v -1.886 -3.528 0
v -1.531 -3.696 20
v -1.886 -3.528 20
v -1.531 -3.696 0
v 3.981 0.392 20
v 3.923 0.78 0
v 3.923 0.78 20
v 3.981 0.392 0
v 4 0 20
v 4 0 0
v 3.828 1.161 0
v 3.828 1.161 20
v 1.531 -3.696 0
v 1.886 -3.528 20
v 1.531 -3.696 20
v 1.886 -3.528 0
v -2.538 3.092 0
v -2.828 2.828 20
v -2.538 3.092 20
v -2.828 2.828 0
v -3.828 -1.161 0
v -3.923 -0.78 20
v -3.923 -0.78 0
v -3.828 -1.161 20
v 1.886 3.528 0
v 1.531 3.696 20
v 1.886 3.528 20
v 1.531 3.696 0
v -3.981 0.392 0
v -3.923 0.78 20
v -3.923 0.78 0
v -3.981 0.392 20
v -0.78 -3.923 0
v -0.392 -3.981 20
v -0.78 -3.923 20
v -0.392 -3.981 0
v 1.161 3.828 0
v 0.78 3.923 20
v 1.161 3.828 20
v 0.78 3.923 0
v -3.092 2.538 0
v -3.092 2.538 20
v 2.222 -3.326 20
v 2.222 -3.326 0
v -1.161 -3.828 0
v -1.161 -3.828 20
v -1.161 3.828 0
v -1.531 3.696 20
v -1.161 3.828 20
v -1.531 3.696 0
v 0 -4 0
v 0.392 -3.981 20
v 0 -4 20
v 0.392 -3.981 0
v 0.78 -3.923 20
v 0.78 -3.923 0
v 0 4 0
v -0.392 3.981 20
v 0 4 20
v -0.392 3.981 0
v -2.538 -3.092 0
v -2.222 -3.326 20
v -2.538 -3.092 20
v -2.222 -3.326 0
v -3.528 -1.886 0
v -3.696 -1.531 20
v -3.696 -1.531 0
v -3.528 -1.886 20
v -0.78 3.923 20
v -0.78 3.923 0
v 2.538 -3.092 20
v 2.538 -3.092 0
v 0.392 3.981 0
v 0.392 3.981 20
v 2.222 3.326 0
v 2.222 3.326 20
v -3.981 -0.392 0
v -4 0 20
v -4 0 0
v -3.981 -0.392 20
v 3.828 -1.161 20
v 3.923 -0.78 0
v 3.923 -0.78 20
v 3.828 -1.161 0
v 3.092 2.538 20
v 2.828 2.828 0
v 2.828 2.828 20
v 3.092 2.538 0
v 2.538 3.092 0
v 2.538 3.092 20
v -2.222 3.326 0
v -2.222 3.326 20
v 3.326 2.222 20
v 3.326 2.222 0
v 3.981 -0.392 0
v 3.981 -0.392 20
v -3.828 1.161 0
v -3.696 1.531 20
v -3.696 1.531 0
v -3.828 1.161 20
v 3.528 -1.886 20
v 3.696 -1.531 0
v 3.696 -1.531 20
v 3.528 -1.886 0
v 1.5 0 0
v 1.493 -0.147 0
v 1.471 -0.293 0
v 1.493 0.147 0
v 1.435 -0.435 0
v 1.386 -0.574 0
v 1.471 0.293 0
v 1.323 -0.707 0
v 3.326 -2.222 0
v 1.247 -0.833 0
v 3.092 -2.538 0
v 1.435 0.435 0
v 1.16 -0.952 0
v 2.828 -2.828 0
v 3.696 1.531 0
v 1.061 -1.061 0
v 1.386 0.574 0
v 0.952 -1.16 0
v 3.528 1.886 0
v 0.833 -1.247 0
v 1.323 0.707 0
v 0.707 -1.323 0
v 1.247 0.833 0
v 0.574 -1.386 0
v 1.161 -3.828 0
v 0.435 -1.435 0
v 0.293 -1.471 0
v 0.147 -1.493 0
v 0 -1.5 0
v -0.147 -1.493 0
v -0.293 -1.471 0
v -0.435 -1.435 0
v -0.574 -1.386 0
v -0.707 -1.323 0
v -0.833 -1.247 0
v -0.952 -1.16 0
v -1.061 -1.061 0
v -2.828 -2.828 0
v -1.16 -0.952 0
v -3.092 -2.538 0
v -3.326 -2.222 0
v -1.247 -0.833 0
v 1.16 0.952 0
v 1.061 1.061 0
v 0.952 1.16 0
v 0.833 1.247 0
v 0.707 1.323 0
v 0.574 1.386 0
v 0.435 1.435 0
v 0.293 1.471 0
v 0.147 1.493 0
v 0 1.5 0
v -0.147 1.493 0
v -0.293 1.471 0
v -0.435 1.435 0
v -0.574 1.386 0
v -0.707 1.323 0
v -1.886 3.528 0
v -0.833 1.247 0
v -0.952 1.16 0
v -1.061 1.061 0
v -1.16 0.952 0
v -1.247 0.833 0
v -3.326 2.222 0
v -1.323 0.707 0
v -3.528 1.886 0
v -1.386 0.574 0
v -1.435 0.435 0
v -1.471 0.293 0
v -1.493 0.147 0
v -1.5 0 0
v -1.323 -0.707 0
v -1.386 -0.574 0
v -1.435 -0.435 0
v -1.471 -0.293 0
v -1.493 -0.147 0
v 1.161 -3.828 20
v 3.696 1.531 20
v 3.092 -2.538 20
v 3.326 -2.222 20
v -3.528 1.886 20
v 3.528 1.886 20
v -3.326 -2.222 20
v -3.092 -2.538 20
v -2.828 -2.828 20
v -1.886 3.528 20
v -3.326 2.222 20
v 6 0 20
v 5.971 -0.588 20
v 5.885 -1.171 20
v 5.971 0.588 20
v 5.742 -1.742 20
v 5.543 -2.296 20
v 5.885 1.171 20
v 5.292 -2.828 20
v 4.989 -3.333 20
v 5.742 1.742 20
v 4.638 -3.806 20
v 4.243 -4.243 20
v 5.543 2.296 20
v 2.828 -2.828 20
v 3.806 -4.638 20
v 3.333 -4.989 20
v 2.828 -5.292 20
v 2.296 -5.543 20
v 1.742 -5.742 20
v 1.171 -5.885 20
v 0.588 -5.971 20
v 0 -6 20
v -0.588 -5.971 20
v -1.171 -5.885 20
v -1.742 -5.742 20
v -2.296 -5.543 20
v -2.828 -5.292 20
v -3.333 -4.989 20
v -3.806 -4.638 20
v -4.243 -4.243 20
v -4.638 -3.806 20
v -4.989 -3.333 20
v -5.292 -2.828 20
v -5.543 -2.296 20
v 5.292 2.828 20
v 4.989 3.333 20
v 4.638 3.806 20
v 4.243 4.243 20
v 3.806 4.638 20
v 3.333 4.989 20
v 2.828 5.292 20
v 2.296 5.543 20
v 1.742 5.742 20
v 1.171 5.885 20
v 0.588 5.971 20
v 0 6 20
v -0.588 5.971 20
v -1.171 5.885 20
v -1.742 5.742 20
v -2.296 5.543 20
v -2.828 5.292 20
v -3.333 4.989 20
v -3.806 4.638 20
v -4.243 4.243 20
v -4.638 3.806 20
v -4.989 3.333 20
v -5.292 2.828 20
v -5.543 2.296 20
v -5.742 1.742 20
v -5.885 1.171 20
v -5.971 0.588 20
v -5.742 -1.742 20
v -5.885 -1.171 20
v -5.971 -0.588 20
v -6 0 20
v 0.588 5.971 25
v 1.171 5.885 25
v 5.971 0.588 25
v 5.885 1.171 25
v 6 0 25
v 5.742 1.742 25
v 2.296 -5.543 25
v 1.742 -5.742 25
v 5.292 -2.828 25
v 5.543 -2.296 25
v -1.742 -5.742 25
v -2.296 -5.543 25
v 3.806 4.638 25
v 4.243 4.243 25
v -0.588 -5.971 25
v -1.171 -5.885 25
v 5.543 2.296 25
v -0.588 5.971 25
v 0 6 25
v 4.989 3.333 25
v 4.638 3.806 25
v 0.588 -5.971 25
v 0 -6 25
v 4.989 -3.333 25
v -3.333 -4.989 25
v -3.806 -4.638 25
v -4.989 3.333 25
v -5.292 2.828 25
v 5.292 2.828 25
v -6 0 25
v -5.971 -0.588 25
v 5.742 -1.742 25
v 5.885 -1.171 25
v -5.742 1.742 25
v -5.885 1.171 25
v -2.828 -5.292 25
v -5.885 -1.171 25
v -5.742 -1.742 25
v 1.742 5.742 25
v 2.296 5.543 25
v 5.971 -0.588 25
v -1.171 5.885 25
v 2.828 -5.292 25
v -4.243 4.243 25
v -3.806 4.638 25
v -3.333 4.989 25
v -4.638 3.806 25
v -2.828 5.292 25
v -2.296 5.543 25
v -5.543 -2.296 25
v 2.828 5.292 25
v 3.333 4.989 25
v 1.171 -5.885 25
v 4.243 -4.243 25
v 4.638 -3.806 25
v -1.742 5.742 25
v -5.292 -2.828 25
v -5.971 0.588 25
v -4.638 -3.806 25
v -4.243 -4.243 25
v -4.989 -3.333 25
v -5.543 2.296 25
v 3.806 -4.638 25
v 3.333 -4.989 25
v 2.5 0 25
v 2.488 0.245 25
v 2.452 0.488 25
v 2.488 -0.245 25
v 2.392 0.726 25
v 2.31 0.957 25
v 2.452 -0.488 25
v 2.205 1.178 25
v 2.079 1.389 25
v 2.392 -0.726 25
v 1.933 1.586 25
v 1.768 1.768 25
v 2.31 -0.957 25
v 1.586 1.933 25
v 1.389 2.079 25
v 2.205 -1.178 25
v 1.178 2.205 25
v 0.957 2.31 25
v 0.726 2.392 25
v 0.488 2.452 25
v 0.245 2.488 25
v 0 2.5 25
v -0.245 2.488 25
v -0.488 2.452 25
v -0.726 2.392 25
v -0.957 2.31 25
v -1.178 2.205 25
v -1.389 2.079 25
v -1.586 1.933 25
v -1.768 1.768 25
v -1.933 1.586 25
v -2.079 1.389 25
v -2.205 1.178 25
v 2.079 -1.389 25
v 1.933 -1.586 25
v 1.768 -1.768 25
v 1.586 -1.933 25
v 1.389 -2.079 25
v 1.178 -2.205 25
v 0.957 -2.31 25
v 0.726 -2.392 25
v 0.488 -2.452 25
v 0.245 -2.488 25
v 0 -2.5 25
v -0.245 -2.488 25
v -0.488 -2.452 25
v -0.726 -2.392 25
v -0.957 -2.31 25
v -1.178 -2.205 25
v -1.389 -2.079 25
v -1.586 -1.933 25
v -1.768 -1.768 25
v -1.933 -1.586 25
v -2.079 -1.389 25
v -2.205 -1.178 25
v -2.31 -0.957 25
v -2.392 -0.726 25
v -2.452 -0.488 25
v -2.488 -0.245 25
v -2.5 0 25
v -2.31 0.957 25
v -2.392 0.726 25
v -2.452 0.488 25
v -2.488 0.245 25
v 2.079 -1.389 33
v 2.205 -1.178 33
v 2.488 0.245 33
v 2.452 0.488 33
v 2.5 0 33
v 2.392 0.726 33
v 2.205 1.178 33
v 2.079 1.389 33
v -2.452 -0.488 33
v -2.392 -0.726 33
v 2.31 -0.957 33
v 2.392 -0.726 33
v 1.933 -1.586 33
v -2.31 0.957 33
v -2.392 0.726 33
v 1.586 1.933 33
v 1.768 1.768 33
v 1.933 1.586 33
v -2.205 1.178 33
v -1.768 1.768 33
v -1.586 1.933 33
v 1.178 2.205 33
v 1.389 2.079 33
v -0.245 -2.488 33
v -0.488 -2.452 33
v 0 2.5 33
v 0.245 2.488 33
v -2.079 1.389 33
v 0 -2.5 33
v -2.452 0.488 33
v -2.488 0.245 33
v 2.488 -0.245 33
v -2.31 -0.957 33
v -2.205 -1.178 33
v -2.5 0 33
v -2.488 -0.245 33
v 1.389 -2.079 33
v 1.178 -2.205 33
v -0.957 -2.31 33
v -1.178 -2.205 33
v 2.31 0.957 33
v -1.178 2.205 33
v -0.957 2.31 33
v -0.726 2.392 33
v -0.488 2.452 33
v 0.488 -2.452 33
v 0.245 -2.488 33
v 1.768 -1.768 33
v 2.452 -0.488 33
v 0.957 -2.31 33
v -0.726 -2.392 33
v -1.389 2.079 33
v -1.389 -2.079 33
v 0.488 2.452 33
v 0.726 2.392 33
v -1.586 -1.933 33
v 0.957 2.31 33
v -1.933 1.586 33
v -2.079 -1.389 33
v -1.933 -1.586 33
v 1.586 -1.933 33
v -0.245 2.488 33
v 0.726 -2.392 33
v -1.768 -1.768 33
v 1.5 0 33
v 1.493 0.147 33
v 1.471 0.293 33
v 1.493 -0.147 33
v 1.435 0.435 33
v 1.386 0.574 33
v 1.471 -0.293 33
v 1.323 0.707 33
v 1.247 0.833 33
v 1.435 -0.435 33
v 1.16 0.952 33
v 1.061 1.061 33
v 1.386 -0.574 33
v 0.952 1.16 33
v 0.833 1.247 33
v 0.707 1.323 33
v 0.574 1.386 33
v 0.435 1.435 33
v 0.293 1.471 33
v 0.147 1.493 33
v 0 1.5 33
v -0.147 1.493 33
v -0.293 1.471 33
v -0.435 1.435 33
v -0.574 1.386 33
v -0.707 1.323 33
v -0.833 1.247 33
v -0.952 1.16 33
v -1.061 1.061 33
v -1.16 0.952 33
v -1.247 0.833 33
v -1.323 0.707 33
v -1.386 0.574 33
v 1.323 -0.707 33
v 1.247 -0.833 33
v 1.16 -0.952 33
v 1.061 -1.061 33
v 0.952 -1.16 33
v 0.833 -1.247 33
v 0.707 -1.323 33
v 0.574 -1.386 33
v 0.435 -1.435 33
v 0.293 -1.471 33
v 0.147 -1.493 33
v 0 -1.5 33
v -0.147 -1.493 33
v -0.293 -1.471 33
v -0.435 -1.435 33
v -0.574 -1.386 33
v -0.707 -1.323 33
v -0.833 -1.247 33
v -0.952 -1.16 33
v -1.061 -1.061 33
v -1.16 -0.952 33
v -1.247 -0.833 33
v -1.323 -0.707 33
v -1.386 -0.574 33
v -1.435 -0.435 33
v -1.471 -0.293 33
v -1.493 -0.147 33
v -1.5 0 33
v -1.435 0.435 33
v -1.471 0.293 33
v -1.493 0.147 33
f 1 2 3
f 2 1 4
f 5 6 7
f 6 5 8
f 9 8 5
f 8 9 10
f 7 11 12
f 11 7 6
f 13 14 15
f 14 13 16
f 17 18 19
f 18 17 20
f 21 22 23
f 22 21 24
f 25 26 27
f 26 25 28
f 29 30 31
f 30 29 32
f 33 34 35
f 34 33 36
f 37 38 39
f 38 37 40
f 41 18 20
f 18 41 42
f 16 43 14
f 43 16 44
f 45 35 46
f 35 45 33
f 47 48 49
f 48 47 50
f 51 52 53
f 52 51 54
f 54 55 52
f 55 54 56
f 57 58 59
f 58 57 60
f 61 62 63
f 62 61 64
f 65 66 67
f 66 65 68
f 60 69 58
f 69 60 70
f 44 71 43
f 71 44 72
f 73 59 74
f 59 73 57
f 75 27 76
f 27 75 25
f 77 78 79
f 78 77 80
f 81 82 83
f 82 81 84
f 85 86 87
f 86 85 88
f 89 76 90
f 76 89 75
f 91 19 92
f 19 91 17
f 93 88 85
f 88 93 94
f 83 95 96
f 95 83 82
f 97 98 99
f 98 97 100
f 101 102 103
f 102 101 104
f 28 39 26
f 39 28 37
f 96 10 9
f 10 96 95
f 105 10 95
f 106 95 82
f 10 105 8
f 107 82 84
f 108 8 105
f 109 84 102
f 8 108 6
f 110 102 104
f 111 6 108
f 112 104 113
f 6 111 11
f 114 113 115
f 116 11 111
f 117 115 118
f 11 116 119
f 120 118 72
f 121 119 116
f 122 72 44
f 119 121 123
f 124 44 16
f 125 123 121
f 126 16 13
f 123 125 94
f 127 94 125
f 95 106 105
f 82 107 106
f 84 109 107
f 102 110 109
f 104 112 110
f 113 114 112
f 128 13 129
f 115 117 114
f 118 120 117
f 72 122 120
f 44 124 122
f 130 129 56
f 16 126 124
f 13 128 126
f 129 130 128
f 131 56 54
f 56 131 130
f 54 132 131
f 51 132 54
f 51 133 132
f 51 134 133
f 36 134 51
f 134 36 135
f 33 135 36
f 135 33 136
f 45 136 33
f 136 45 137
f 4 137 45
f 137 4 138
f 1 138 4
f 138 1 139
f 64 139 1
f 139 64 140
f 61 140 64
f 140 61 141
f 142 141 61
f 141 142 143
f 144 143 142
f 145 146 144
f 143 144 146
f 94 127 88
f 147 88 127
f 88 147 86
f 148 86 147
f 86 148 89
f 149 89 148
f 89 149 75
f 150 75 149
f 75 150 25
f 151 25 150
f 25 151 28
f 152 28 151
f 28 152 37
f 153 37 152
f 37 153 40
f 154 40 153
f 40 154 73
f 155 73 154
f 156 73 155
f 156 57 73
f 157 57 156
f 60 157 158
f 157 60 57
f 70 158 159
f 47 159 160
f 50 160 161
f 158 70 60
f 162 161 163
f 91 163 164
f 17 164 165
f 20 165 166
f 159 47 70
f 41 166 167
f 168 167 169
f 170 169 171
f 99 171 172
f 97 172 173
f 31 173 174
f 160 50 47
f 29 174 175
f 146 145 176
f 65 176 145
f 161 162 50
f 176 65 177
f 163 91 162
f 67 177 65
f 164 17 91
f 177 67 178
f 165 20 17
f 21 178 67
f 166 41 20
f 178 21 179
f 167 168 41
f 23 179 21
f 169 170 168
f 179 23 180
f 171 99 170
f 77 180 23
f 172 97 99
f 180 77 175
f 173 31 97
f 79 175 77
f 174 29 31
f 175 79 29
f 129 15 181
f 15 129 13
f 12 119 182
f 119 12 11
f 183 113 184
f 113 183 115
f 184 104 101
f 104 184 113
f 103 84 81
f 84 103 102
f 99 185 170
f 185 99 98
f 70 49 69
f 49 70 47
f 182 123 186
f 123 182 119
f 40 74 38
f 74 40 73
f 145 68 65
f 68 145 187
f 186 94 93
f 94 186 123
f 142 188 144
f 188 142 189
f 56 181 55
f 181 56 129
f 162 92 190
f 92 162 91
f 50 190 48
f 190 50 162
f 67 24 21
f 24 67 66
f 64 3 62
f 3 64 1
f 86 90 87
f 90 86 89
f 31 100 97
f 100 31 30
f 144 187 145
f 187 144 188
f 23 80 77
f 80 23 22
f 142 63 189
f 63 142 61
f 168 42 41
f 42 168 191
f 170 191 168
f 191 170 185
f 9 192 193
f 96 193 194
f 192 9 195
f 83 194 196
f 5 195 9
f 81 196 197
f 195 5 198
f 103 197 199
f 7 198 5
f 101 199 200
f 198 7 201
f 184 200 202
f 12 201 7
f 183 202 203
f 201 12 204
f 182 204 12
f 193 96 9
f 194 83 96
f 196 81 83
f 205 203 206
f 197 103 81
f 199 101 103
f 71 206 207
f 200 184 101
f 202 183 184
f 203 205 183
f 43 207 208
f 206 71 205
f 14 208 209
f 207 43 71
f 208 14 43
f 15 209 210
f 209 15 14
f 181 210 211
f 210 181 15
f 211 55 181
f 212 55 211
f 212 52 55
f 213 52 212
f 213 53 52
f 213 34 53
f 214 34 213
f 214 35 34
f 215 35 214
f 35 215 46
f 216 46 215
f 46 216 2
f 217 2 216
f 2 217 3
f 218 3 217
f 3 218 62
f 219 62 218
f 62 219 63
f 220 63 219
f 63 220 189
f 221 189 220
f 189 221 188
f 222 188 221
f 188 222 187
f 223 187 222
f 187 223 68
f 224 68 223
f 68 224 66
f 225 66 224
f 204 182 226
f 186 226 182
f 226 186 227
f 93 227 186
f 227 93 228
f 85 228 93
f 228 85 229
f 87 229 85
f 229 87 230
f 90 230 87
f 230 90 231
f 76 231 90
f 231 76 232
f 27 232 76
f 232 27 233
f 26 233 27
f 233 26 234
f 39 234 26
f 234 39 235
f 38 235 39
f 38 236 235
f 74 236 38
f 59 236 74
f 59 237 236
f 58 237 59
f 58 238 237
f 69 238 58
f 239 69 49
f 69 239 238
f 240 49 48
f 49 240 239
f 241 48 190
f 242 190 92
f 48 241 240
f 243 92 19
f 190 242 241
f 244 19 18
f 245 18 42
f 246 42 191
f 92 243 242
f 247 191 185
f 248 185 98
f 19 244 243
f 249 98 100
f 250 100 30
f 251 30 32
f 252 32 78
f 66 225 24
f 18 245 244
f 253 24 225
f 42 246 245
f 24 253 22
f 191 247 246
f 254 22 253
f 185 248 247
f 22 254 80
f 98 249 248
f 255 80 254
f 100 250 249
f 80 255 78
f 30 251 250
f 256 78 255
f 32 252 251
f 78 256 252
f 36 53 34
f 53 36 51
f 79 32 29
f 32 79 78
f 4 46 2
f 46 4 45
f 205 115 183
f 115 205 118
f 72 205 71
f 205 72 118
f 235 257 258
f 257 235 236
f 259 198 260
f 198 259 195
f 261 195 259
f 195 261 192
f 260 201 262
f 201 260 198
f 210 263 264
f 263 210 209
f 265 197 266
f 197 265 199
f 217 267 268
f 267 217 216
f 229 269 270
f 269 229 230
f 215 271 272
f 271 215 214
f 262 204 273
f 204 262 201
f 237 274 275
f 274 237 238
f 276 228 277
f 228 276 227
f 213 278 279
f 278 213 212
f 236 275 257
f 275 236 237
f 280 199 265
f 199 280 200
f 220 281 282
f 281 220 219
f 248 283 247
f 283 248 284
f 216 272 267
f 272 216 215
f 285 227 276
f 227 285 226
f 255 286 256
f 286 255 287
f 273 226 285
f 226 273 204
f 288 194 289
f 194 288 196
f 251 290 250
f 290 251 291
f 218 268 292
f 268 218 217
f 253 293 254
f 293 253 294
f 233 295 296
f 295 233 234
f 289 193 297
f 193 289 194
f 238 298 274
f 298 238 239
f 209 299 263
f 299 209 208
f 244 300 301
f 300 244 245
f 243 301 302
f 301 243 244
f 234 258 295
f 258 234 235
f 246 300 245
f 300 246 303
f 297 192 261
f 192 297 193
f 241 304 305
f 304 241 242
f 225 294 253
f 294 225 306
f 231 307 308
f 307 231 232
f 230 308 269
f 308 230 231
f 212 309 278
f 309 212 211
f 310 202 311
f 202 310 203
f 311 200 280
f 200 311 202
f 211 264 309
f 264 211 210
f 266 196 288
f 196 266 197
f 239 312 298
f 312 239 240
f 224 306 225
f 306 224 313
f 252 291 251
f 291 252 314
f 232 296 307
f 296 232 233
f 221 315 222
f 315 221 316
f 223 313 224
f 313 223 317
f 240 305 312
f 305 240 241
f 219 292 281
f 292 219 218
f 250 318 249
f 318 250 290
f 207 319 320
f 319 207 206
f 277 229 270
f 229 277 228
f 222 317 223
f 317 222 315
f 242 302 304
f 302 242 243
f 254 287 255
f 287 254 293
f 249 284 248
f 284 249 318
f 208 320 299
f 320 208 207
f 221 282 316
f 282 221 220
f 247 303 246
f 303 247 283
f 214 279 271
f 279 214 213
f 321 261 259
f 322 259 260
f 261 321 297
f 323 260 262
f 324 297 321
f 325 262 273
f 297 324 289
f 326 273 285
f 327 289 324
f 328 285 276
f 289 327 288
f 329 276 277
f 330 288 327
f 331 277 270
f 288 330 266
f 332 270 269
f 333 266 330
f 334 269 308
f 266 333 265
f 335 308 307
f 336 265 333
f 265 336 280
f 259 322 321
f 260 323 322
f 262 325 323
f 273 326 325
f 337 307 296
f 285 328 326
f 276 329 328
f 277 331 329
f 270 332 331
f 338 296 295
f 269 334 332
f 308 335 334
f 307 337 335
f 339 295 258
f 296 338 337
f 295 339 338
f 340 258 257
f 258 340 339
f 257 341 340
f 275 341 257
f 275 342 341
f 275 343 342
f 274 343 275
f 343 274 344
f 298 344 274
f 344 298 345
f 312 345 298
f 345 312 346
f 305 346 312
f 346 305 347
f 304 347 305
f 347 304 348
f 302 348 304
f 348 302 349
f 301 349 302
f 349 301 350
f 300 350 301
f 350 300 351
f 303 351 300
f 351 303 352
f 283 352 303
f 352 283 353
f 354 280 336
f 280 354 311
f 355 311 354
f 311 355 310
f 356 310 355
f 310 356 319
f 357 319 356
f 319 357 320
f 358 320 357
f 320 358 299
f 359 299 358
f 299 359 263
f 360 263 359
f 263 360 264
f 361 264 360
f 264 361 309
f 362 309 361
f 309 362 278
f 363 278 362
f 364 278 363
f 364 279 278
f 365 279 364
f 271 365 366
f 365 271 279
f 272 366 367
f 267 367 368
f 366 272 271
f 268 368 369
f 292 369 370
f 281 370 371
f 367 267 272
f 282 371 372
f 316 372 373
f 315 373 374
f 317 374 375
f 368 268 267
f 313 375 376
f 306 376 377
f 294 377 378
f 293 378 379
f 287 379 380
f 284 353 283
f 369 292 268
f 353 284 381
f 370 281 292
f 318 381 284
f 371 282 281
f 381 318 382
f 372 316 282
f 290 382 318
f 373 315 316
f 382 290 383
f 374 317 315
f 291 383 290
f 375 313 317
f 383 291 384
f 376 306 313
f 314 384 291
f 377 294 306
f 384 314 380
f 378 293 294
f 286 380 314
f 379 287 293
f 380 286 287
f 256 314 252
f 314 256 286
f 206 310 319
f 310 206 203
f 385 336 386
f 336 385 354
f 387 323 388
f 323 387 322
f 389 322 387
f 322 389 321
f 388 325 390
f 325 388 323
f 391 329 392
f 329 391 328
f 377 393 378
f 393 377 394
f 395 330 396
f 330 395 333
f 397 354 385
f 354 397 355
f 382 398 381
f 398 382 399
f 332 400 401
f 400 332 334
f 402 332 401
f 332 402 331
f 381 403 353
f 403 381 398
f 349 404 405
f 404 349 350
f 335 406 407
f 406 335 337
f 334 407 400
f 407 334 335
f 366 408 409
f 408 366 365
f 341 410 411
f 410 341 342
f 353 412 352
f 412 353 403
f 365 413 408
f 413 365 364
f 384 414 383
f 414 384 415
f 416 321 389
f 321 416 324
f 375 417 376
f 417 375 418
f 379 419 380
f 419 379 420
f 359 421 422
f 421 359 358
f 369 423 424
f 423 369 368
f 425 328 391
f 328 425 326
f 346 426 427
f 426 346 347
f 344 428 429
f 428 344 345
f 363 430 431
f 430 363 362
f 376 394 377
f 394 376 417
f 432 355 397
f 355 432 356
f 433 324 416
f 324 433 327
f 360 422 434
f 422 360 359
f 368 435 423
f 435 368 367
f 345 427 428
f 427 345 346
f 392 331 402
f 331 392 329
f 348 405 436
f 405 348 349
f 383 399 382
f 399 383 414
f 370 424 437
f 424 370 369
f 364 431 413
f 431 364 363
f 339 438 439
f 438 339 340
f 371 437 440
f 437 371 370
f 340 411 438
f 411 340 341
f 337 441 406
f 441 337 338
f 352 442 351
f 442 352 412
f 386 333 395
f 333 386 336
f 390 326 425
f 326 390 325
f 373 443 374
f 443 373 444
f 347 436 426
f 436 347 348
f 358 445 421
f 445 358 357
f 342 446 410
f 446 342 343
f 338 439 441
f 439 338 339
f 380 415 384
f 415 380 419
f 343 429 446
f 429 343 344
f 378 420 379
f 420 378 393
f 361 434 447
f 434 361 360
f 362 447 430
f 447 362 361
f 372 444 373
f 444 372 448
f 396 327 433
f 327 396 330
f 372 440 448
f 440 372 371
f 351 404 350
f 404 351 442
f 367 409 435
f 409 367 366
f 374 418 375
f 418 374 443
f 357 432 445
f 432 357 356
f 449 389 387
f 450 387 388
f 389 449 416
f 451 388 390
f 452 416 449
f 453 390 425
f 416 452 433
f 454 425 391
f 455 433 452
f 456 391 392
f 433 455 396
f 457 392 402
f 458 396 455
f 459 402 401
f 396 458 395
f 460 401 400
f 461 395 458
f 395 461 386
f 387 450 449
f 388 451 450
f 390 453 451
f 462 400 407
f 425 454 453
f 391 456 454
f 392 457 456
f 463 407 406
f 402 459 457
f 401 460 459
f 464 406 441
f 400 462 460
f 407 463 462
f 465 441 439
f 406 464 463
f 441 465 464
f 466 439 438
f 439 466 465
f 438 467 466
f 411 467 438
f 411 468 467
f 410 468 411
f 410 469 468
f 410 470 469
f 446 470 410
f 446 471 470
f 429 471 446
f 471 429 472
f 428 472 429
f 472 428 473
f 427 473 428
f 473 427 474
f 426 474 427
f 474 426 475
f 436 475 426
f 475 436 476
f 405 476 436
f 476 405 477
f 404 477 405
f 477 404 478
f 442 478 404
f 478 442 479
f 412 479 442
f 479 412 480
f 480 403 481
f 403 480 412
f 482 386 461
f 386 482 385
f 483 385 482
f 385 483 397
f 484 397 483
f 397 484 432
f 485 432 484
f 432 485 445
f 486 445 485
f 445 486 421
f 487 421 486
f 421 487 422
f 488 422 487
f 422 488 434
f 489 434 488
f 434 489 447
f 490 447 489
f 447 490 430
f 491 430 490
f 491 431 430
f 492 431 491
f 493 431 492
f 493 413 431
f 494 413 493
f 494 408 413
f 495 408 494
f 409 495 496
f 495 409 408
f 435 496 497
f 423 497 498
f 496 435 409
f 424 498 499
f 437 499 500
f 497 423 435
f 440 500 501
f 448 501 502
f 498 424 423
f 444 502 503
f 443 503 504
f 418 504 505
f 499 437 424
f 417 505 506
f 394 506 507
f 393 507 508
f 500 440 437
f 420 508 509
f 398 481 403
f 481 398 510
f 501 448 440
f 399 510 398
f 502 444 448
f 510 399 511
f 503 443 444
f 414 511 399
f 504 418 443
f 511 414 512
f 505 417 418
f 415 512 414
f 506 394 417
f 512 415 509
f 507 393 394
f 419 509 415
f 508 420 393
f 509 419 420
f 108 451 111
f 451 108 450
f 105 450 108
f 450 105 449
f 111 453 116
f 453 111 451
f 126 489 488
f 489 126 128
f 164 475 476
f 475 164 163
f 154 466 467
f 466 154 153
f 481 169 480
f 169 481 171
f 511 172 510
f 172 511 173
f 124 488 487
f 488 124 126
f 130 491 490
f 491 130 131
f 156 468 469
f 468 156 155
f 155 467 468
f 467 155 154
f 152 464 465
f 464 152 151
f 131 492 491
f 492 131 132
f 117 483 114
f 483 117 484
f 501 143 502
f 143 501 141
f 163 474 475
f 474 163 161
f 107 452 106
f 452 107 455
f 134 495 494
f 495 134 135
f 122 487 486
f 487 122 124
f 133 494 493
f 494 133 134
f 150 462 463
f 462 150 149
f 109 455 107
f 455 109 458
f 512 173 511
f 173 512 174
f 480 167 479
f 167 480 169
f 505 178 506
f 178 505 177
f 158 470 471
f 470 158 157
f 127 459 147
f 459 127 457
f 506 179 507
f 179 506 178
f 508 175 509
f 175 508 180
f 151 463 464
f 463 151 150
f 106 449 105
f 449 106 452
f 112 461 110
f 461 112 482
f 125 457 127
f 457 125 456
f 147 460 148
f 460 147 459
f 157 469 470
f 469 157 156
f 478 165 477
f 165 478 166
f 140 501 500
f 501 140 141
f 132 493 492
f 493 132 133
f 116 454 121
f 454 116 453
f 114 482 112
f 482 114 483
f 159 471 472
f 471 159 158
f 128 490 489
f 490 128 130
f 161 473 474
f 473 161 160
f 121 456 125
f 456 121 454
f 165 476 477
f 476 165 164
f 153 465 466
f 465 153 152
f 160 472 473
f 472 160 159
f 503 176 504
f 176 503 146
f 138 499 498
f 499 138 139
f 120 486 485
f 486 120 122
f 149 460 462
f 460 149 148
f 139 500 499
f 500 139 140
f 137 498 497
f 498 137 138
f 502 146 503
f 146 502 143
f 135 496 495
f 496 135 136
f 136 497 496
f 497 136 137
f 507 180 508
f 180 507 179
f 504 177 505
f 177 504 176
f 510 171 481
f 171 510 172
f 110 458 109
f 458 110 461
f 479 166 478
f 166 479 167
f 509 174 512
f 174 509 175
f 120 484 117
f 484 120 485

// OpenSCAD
// Hose-barb reducer: 8 mm OD barb -> 5 mm OD barb
// Print orientation: standing on the bed, barbs pointing up (+Z)

$fn = 64;

// ---- Dimensions (mm) ----
tube_a_d      = 8;    // larger tube outer diameter
tube_b_d      = 5;    // smaller tube outer diameter
bore_d        = 3;    // through-bore diameter

barb_a_h      = 20;   // height of the 8 mm barb section
barb_b_h      = 8;    // height of the 5 mm barb section
collar_h      = 5;    // height of the 12 mm collar (z = 20..25)

eps           = 0.5;  // cutter overshoot past faces

// ---- Derived ----
tube_a_r      = tube_a_d / 2;
tube_b_r      = tube_b_d / 2;
bore_r        = bore_d / 2;
collar_d      = 12;

// Total height: 0..20, 20..25, 25..41
total_h       = barb_a_h + collar_h + barb_b_h;

// ---- Model ----
difference() {
    union() {
        // Lower barb section (z = 0 to 20)
        cylinder(h = barb_a_h, r = tube_a_r);

        // Collar (z = 20 to 25)
        translate([0, 0, barb_a_h])
            cylinder(h = collar_h, d = collar_d);

        // Upper barb section (z = 25 to 41)
        translate([0, 0, barb_a_h + collar_h])
            cylinder(h = barb_b_h, r = tube_b_r);
    }

    // Through-bore along Z
    translate([0, 0, -eps])
        cylinder(h = total_h + 2 * eps, r = bore_r);
}
